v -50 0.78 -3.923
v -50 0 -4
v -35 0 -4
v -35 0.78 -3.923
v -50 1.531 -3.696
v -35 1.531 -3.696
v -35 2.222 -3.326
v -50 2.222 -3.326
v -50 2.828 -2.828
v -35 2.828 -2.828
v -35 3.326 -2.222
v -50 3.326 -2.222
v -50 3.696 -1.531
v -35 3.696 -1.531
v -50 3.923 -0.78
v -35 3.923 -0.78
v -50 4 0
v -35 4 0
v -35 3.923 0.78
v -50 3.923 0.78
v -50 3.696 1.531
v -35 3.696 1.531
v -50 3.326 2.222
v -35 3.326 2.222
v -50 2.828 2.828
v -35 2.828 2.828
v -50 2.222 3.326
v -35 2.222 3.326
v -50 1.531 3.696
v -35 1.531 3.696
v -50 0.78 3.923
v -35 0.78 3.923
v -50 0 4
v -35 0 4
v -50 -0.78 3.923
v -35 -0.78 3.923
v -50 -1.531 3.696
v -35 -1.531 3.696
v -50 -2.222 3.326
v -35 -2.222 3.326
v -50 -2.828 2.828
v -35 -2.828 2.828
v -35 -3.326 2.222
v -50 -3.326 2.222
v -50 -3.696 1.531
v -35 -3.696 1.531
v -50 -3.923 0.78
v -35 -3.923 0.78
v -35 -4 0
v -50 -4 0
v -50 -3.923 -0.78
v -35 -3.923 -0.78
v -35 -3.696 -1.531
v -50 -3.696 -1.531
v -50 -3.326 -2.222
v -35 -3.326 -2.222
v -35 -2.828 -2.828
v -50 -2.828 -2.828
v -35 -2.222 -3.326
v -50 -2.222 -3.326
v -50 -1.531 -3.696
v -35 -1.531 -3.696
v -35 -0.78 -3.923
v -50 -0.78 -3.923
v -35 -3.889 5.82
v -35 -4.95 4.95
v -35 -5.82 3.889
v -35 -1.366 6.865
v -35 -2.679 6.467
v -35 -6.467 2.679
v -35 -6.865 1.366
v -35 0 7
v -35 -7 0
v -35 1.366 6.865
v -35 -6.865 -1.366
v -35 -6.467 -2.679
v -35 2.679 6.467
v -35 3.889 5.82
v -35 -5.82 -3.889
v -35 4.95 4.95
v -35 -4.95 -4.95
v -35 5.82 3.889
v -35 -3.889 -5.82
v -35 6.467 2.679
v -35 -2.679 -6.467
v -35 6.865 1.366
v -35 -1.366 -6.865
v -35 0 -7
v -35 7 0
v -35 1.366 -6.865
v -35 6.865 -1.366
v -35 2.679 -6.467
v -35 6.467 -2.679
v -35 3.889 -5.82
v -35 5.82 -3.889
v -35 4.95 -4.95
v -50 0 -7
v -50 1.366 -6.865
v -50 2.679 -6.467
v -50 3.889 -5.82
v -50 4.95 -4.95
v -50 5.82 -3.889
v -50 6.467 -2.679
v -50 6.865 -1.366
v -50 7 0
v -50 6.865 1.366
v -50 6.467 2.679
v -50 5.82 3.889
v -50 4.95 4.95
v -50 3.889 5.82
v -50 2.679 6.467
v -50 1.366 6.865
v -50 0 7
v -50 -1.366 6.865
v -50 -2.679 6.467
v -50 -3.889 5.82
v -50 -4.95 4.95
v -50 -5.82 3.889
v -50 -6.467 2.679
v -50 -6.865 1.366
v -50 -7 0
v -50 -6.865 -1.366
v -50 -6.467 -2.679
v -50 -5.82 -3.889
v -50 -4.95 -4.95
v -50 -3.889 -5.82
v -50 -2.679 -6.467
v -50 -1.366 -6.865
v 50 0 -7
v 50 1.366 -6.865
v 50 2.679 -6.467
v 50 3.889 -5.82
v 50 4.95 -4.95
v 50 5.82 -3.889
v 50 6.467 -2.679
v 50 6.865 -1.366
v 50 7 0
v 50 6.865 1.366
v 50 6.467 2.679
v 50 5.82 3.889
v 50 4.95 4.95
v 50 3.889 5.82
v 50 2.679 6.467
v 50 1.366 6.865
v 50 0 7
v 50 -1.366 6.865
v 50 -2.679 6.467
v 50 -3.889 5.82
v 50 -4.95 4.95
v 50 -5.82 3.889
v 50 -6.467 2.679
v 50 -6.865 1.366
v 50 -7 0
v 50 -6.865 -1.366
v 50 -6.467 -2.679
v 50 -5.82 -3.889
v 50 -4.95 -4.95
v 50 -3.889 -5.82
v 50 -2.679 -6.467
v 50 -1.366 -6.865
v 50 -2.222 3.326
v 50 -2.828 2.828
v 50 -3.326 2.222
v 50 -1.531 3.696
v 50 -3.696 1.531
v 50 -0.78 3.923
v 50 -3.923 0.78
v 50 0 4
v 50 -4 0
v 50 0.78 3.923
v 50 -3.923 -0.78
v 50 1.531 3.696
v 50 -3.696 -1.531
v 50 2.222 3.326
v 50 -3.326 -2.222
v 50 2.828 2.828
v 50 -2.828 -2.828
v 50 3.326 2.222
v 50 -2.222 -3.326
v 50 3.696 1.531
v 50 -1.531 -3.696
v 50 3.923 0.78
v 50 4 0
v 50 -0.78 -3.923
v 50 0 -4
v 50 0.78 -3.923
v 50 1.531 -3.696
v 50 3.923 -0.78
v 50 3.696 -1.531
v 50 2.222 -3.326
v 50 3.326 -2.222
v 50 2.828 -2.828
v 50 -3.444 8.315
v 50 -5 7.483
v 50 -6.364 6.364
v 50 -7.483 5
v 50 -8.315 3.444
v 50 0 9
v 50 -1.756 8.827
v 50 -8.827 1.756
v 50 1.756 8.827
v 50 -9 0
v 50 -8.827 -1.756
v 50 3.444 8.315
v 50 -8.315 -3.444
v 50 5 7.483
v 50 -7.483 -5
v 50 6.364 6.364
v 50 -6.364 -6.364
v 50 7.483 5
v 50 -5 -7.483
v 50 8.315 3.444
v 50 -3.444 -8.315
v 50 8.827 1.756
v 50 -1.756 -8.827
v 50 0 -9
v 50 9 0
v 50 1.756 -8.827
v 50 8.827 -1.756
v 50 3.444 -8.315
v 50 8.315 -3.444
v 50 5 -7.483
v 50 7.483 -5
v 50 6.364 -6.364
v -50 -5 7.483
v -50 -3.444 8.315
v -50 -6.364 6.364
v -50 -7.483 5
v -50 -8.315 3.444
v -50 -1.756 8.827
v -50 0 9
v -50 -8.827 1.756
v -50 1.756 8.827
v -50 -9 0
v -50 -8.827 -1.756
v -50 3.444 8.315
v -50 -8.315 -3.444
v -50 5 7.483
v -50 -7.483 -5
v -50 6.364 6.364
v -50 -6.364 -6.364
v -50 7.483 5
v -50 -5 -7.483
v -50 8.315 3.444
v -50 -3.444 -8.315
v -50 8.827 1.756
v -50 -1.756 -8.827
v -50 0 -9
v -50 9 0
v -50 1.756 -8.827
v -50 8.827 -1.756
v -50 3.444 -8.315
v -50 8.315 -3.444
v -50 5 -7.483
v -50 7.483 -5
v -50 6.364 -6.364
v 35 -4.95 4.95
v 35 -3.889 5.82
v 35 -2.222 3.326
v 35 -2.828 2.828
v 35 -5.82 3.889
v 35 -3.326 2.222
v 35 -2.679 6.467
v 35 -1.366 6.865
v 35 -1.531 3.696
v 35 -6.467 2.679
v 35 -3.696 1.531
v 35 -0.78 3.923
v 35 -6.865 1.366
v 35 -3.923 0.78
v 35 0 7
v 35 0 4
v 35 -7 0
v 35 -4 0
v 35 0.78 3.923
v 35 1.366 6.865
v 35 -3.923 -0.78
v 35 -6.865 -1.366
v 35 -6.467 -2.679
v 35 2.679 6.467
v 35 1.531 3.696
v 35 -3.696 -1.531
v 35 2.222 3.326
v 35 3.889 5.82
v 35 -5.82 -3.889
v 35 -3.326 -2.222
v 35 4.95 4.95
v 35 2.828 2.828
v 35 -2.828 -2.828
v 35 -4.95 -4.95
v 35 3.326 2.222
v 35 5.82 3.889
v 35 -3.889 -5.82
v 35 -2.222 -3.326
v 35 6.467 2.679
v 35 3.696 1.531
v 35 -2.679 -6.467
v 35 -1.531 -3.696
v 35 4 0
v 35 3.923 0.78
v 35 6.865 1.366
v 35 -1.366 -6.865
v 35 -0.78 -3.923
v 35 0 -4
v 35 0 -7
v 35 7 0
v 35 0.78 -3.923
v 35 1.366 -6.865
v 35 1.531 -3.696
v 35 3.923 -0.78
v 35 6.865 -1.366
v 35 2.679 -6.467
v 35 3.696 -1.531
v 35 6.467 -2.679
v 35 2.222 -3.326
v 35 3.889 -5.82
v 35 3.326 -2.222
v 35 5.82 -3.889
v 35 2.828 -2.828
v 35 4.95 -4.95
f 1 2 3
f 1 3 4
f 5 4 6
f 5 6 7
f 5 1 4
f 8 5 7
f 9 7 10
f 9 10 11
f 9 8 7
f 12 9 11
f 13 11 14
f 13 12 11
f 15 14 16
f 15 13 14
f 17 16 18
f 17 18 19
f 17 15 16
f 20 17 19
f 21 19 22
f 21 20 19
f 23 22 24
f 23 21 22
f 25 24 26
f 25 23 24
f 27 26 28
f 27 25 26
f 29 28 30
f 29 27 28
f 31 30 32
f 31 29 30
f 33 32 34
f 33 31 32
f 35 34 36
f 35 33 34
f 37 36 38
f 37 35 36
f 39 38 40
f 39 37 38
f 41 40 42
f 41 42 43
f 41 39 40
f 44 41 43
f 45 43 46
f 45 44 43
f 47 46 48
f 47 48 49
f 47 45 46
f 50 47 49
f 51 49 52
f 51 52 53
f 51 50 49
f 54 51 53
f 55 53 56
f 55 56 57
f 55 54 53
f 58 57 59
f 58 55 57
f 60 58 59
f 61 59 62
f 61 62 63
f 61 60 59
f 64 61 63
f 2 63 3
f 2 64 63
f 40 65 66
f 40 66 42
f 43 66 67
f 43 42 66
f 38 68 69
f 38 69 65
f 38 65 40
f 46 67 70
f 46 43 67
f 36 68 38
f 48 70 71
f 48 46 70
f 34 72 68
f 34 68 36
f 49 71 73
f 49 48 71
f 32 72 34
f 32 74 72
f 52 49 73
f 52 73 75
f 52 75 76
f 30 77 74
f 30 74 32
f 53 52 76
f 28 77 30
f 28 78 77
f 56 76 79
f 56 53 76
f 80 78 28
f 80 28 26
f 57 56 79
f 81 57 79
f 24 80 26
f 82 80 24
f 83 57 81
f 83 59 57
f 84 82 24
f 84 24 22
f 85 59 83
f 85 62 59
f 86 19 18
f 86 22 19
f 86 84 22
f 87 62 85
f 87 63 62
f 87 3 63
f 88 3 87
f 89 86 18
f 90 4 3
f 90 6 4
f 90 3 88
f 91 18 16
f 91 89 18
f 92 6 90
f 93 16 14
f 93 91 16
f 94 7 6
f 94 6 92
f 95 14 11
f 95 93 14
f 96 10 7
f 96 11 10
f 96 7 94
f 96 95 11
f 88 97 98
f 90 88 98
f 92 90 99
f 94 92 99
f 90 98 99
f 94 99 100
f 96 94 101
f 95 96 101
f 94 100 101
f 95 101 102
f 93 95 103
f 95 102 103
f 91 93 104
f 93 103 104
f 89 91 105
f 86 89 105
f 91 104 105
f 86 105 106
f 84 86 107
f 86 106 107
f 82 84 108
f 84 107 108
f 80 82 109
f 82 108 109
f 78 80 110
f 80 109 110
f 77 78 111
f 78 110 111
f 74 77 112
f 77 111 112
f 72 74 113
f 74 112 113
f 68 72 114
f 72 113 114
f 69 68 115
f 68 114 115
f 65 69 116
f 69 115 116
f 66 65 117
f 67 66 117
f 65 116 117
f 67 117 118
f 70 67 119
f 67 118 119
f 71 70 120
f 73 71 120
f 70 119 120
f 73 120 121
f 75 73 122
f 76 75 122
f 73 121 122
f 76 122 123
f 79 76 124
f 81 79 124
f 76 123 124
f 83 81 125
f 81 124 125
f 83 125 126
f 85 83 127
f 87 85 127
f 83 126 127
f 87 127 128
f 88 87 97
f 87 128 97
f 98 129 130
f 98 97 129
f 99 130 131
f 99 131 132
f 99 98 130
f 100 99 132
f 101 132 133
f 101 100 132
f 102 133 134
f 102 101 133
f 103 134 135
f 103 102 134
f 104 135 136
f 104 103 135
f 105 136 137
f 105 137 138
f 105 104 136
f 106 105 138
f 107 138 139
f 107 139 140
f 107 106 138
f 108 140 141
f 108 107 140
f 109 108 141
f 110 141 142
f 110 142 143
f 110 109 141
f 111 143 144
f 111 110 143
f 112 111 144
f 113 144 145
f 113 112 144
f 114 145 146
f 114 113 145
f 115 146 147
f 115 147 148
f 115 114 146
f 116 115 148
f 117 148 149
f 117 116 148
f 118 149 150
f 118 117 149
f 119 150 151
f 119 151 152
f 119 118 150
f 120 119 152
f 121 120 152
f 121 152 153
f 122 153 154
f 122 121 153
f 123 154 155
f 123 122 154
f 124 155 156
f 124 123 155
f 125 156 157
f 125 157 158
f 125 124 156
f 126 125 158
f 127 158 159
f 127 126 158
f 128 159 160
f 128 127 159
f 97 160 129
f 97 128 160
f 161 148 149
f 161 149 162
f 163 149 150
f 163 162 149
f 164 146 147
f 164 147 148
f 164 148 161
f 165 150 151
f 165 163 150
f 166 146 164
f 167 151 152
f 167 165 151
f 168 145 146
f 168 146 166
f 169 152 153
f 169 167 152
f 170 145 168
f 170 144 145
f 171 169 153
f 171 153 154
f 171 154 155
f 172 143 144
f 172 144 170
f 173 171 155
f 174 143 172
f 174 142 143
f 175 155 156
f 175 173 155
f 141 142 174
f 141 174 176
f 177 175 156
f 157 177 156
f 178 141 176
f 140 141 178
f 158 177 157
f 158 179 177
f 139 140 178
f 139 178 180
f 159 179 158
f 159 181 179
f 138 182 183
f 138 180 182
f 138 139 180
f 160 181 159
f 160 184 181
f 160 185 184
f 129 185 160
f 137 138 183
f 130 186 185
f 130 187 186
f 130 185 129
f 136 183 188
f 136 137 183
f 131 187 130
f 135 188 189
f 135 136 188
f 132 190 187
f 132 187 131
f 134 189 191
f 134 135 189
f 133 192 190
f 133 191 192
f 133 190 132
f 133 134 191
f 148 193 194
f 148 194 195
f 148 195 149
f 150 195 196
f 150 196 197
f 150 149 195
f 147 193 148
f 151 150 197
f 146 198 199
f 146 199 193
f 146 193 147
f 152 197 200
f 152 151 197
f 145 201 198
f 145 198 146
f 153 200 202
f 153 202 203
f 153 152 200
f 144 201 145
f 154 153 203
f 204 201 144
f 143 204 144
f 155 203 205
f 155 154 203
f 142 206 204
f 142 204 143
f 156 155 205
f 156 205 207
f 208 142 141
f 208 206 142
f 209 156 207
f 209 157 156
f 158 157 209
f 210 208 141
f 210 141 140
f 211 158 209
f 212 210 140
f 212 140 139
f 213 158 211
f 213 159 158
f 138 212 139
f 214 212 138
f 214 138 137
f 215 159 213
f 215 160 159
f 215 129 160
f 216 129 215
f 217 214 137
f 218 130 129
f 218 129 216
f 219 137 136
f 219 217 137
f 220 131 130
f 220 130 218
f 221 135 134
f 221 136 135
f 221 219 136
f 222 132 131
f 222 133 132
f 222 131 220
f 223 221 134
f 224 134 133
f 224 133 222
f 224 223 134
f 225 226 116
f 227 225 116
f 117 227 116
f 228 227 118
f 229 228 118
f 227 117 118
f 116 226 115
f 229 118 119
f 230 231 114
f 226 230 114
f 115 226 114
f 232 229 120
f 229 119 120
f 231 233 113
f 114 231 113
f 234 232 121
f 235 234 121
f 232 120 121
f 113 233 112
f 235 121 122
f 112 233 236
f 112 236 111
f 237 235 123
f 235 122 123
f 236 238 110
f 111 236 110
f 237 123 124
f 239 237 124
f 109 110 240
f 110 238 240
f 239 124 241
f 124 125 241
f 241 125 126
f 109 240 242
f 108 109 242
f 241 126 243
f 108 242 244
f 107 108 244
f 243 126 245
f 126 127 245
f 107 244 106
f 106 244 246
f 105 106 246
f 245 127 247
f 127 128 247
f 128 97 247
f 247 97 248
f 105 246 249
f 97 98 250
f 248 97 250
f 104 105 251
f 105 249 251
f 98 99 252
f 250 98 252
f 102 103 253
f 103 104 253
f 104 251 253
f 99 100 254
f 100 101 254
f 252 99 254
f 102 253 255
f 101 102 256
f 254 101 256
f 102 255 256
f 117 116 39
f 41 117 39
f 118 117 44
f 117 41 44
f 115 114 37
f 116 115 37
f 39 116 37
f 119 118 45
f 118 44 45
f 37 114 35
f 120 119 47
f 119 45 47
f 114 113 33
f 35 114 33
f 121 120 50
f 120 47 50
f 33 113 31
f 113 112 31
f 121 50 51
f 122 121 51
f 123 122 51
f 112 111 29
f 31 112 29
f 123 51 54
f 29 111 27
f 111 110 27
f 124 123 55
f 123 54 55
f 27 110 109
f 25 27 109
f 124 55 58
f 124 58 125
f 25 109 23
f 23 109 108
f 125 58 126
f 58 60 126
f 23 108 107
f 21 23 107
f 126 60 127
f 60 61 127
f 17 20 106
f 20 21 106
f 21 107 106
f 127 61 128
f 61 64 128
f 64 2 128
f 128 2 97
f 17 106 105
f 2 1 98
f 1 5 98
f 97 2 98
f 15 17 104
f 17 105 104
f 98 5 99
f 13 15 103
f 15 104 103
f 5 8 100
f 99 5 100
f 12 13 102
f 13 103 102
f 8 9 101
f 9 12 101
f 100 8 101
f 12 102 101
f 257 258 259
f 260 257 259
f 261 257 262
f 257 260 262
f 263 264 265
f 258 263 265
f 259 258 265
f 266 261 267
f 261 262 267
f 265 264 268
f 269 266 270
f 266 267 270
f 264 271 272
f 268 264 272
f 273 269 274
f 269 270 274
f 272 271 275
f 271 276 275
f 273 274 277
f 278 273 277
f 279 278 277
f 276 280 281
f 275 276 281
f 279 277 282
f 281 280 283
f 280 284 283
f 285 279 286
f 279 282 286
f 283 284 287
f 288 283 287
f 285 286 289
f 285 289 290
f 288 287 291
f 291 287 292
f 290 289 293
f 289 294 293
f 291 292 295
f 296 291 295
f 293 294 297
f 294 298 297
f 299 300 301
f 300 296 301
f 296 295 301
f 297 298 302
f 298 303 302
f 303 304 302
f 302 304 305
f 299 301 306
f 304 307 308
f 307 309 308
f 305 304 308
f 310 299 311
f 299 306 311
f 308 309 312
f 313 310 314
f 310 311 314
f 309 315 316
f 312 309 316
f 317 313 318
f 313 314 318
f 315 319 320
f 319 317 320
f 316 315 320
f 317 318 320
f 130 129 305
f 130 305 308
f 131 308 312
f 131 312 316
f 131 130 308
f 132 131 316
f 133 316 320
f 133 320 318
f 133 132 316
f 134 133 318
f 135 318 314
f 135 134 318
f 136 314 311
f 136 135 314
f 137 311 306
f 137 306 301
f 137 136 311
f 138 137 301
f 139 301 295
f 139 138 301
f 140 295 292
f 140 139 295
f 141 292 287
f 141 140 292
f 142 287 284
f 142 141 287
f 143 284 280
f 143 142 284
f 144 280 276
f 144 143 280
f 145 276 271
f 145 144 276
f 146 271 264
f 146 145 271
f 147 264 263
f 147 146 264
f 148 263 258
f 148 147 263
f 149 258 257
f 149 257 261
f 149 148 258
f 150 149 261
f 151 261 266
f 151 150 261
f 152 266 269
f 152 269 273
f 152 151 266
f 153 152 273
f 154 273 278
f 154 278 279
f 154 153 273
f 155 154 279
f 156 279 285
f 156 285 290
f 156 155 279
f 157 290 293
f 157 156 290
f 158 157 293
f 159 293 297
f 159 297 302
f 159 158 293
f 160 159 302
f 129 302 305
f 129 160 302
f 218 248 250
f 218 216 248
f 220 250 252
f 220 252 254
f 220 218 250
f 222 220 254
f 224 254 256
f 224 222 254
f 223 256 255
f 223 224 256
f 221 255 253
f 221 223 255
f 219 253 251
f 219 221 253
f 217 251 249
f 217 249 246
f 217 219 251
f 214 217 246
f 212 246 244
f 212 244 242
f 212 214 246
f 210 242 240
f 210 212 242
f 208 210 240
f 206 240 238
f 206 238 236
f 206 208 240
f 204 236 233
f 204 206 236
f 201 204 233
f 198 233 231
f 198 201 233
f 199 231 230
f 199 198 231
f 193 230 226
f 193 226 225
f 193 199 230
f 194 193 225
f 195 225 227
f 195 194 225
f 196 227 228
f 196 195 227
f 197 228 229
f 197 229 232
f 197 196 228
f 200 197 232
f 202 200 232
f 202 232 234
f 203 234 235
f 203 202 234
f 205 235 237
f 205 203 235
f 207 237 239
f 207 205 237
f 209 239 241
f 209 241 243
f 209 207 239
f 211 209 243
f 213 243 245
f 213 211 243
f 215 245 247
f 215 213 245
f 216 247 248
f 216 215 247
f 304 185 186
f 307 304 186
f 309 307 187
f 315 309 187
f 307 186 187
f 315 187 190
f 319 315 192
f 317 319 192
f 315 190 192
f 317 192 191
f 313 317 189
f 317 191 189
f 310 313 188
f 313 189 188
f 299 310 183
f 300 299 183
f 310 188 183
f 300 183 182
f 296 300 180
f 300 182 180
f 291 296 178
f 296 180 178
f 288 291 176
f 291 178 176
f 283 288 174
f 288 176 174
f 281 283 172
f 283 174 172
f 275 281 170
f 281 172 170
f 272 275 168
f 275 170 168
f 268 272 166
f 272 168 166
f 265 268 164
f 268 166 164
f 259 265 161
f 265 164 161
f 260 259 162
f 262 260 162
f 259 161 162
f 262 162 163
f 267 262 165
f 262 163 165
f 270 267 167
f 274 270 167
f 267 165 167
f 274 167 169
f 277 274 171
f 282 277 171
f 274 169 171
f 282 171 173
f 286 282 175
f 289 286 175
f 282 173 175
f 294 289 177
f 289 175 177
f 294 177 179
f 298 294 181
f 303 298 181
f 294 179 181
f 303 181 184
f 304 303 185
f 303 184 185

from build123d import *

# Parameters (mm, degrees)
SKETCH1_R           = 9
SKETCH1_R_2         = 7
BOSS_EXTRUDE1_DEPTH = 50
SKETCH3_R           = 7
SKETCH3_R_2         = 4
BOSS_EXTRUDE3_DEPTH = 15
BOSS_EXTRUDE4_START = -100
SKETCH3_2_R         = 7
SKETCH3_2_R_2       = 4
BOSS_EXTRUDE4_DEPTH = 15


with BuildPart() as part:
    # Sketch1 → Boss-Extrude1 (new, symmetric)
    with BuildSketch(Plane(origin=(0, 0, 0), x_dir=(0, 0, -1), z_dir=(1, 0, 0))):
        Circle(SKETCH1_R)
        Circle(SKETCH1_R_2, mode=Mode.SUBTRACT)
    extrude(amount=BOSS_EXTRUDE1_DEPTH, both=True)


with BuildPart() as body_2:
    # Sketch3 → Boss-Extrude3 (new body)
    with BuildSketch(Plane(origin=(50, 0, 0), x_dir=(0, 0, -1), z_dir=(1, 0, 0))):
        Circle(SKETCH3_R)
        Circle(SKETCH3_R_2, mode=Mode.SUBTRACT)
    extrude(amount=-BOSS_EXTRUDE3_DEPTH)


with BuildPart() as body_3:
    # Sketch3<2> → Boss-Extrude4 (new body)
    with BuildSketch(Plane(origin=(50, 0, 0), x_dir=(0, 0, -1), z_dir=(1, 0, 0)).offset(BOSS_EXTRUDE4_START)):
        Circle(SKETCH3_2_R)
        Circle(SKETCH3_2_R_2, mode=Mode.SUBTRACT)
    extrude(amount=BOSS_EXTRUDE4_DEPTH)


solid = Compound([part.part, body_2.part, body_3.part])
